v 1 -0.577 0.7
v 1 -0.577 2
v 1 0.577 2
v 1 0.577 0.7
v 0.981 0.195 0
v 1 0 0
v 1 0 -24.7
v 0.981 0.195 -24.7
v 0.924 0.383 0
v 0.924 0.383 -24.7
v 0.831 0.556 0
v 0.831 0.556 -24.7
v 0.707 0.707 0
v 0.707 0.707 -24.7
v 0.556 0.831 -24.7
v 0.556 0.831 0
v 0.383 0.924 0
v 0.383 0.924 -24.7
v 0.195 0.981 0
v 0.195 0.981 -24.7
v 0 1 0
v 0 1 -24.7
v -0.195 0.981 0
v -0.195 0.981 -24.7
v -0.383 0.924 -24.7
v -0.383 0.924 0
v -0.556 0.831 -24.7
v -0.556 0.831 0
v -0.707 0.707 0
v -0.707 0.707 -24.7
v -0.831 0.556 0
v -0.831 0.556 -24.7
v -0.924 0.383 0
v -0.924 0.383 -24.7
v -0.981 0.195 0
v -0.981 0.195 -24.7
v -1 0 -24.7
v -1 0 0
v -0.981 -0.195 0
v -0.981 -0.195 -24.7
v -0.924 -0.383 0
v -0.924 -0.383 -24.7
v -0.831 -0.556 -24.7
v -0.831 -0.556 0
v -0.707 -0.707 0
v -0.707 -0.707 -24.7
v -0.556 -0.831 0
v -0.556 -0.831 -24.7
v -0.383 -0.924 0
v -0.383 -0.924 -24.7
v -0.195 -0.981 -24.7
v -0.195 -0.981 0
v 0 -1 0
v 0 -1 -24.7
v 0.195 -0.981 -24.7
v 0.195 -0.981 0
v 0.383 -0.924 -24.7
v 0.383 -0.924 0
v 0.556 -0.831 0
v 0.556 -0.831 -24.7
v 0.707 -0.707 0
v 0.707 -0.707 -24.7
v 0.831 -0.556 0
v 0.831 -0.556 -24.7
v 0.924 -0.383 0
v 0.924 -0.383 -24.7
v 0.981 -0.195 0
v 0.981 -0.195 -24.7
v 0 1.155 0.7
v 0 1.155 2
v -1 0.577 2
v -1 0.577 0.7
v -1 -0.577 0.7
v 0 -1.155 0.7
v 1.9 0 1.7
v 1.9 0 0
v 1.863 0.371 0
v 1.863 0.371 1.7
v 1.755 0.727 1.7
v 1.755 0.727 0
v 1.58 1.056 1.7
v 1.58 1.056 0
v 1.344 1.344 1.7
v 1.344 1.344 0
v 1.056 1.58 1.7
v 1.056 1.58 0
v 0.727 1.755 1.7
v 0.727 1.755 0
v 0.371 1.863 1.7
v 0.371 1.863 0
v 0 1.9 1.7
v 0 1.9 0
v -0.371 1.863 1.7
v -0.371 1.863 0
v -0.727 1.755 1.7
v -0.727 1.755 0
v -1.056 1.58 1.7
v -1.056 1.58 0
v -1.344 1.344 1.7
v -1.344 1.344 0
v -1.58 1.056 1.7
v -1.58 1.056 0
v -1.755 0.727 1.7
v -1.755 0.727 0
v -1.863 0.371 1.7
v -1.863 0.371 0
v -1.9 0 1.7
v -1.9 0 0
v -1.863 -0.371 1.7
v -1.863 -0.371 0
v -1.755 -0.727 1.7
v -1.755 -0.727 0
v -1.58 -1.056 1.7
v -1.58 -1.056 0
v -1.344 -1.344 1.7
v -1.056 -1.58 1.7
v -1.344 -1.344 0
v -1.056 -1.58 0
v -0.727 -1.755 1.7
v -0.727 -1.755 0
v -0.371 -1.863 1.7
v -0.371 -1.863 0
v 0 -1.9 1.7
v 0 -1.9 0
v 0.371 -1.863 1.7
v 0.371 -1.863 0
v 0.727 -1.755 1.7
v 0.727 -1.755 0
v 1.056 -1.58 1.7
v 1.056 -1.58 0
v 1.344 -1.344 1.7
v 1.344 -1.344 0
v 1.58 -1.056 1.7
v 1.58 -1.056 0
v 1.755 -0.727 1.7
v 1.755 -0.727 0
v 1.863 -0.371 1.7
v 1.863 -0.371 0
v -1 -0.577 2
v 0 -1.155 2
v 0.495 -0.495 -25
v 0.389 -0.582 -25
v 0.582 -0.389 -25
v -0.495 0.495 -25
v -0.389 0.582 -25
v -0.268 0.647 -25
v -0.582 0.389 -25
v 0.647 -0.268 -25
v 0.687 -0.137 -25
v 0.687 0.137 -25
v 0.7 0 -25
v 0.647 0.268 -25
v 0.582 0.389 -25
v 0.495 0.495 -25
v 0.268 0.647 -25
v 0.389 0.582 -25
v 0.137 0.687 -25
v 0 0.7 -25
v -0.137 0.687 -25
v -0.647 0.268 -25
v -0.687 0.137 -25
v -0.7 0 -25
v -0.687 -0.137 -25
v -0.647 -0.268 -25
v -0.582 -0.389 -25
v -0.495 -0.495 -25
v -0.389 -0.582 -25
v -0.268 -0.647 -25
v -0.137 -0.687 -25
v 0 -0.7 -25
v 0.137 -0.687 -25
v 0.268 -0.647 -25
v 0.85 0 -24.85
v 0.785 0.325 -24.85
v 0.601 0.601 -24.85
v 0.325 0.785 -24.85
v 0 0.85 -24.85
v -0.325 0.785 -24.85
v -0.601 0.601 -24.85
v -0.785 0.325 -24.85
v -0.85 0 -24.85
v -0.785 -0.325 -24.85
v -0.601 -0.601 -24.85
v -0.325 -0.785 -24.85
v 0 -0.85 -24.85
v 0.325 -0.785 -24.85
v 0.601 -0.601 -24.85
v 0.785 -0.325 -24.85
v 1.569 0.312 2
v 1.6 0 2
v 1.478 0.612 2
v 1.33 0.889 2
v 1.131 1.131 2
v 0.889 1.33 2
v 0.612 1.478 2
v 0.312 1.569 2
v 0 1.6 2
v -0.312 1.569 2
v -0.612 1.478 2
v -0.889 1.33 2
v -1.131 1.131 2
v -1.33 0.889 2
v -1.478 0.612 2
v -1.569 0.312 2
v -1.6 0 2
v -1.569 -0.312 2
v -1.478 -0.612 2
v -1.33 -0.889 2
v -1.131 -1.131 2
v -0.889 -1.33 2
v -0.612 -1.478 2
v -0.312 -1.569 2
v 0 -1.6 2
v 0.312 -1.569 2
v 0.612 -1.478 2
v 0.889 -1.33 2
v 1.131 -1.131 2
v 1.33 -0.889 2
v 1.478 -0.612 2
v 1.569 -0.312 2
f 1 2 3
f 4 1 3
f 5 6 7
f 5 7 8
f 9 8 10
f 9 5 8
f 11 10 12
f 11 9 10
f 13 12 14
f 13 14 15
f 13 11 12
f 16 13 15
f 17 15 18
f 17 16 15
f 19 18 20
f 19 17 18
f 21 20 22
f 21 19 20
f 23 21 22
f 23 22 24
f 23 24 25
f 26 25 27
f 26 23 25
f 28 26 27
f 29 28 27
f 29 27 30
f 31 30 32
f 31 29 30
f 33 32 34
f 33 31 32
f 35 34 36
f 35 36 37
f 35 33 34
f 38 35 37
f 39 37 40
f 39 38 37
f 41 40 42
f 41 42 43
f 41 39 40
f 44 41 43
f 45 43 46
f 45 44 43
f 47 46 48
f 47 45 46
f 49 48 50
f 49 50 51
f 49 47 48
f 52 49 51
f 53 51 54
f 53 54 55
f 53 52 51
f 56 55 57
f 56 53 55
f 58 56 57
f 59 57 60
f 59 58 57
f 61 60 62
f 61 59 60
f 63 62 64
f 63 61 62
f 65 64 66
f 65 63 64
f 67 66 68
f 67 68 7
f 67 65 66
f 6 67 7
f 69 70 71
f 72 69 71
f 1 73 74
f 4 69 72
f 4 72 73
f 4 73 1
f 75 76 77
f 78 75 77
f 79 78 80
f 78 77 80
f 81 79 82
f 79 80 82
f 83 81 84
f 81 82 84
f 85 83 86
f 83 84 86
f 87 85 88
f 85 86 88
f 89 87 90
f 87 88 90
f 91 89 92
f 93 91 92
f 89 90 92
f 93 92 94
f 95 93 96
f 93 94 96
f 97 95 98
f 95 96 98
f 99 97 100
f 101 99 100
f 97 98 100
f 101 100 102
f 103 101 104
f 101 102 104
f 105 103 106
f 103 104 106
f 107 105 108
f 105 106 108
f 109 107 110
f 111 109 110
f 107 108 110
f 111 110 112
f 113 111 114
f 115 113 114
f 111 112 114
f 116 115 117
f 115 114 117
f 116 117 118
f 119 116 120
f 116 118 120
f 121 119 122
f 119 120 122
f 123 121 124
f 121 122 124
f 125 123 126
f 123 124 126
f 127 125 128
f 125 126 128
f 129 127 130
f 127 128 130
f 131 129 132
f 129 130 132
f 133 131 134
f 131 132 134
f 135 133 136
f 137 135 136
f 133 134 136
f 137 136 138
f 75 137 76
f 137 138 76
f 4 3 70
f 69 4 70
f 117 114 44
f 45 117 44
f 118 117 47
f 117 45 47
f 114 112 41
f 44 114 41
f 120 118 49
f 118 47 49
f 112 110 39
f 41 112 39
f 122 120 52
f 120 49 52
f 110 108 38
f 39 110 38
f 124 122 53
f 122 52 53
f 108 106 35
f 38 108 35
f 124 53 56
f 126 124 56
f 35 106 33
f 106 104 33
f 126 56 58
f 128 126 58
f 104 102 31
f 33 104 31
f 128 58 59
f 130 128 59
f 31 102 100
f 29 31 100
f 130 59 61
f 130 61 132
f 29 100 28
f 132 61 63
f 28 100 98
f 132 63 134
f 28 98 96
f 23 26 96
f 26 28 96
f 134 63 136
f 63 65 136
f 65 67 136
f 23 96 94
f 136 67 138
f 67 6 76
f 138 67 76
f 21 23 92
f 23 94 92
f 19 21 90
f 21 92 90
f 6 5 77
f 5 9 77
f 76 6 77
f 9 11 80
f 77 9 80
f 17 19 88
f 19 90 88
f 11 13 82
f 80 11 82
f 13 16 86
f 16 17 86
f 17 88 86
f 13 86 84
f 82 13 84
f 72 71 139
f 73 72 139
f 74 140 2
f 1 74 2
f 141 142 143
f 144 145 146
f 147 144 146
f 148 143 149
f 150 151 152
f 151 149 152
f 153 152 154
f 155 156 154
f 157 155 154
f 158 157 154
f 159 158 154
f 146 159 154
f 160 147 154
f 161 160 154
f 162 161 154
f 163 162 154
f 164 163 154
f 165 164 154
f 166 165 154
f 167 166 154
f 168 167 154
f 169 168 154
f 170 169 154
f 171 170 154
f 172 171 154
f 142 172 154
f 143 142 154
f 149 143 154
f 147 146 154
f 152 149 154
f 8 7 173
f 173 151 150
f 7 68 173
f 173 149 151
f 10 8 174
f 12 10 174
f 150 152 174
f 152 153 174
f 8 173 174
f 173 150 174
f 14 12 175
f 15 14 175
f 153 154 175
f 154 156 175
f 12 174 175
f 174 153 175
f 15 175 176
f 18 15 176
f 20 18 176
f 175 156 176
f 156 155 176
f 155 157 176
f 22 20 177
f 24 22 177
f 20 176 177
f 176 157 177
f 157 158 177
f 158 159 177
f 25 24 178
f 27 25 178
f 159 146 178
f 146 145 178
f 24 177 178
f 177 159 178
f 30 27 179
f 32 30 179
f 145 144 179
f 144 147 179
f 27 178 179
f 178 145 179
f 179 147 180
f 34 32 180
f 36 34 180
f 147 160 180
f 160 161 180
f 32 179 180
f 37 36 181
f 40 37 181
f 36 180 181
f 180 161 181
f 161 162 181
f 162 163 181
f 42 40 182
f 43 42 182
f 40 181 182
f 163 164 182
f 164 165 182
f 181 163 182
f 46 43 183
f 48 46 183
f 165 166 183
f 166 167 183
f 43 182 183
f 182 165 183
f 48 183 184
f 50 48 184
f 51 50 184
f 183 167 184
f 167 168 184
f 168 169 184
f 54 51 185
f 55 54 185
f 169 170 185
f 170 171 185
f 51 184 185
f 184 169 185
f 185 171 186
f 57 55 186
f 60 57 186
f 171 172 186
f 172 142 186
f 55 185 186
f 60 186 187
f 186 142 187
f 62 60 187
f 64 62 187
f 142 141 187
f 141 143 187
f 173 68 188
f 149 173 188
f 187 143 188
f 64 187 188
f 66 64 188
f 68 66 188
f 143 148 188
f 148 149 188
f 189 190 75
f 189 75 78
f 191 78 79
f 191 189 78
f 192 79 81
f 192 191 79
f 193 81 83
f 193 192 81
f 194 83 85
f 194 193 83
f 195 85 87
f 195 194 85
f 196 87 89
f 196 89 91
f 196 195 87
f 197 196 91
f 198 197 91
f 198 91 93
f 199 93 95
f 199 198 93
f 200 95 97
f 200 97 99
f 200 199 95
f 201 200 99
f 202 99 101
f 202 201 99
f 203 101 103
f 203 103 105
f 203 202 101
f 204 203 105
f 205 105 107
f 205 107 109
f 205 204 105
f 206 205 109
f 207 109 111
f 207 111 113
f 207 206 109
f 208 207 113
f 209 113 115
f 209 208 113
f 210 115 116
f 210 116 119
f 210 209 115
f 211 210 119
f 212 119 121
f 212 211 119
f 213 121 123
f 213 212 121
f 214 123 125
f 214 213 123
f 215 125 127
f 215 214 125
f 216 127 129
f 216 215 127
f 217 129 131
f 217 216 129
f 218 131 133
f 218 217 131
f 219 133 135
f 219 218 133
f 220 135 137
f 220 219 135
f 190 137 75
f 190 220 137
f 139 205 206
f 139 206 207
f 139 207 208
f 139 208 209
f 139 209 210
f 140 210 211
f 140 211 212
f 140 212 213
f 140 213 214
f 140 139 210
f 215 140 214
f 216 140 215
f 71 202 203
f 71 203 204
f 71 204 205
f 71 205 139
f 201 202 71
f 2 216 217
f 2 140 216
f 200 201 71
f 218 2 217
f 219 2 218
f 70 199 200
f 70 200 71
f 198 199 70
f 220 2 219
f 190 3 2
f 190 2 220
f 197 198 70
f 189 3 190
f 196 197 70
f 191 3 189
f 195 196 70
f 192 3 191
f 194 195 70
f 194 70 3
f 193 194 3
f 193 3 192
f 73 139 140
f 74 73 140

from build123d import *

# Parameters (mm, degrees)
F2_R      = 1
F3_DEPTH  = 25
F2_R_2    = 1.9
F3_FACE_R = 1
F4_DEPTH  = 2
F5_SIZE   = 0.3
F7_DEPTH  = 1.3


with BuildPart() as f3:
    # F2 (on Top) → F3 (new body)
    with BuildSketch(Plane.XY):
        Circle(F2_R)
    extrude(amount=-F3_DEPTH)

    # F2 (on Top) + F3_face (on face) → F4 (join)
    with BuildSketch(Plane.XY):
        Circle(F2_R_2)
        Circle(F2_R, mode=Mode.SUBTRACT)
    with BuildSketch(Plane.XY):
        Circle(F3_FACE_R)
    extrude(amount=F4_DEPTH)

    # F5
    f5_edges = [f3.edges().sort_by_distance(p)[0] for p in [
        (-1, 0, -25),
        (-1.9, 0, 2),
    ]]
    chamfer(f5_edges, length=F5_SIZE)

    # F6 (on face) → F7 (cut)
    with BuildSketch(Plane.XY.offset(2)):
        Polygon((1, -0.5773502692), (1, 0.5773502692), (0, 1.1547005384), (-1, 0.5773502692), (-1, -0.5773502692), (0, -1.1547005384), align=None)
    extrude(amount=-F7_DEPTH, mode=Mode.SUBTRACT)


solid = f3.part
